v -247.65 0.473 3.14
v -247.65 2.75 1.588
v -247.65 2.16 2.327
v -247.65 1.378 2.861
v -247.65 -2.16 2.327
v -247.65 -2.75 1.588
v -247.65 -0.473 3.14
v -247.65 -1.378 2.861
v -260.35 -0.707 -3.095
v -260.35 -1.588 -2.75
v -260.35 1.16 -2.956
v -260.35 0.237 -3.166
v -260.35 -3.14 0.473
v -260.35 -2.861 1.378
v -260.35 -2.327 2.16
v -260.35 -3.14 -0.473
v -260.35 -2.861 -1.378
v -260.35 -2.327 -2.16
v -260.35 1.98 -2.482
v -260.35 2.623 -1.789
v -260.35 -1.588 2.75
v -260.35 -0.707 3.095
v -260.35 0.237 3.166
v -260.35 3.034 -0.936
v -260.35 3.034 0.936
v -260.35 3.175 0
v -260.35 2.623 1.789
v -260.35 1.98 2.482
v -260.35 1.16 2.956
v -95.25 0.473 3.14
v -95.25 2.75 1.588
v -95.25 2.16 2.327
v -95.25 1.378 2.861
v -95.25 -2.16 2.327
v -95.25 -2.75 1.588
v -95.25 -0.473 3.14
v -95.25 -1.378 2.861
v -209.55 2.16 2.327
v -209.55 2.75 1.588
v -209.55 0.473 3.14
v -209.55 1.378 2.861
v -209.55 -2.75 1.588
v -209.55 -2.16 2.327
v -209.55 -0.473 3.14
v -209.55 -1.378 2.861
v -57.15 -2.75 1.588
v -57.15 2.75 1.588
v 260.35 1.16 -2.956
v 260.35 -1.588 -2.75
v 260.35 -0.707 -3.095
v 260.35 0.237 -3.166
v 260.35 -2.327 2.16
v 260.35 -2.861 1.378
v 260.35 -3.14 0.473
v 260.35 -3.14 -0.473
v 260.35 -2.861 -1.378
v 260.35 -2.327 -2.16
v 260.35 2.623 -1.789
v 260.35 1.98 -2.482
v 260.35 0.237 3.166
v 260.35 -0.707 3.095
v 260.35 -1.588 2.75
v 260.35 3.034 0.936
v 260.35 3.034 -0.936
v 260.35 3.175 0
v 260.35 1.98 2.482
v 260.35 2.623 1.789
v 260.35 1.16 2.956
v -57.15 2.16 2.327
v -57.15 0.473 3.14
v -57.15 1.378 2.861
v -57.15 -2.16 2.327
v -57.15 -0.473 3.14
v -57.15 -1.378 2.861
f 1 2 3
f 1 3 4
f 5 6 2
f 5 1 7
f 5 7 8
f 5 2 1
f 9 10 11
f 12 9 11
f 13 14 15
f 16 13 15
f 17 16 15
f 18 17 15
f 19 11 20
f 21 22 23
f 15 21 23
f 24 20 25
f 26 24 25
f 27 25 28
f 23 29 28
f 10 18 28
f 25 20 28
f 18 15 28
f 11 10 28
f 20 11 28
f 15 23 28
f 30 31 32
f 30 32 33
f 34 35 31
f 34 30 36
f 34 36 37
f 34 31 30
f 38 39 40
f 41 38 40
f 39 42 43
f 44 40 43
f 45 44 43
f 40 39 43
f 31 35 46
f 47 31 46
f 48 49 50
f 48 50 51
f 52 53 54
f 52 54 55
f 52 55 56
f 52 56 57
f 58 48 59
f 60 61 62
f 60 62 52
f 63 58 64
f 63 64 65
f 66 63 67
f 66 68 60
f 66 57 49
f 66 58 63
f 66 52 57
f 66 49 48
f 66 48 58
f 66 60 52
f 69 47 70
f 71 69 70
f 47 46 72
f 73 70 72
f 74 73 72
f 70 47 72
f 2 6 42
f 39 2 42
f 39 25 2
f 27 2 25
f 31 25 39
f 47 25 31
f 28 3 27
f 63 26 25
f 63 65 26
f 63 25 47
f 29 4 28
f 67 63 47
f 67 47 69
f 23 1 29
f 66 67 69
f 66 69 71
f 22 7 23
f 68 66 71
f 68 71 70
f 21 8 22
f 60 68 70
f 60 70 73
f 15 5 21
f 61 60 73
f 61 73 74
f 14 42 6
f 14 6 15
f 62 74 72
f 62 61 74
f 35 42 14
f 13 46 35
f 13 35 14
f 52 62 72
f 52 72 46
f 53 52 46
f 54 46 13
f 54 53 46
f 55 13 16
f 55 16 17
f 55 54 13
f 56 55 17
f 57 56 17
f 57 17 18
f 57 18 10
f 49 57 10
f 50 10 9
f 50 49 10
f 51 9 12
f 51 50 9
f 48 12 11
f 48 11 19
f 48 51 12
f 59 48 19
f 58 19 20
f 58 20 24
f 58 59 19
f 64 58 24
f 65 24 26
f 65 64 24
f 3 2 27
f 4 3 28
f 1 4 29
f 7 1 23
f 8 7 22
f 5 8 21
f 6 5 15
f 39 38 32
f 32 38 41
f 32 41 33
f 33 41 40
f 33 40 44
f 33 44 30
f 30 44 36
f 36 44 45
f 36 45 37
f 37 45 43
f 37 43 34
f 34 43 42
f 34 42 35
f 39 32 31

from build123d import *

# Parameters (mm, degrees)
F0_R     = 3.175
F1_DEPTH = 260.35
F2_W     = 38.1
F2_H     = 5.08
F3_DEPTH = 12.7
F4_W     = 38.1
F4_H     = 5.08
F5_DEPTH = 12.7


with BuildPart() as f1:
    # F0 (on Right) → F1 (new body, symmetric)
    with BuildSketch(Plane.YZ):
        Circle(F0_R)
    extrude(amount=F1_DEPTH, both=True)

    # F2 (on Front) → F3 (cut, symmetric)
    with BuildSketch(Plane.XZ):
        with Locations((-228.6, 4.1275)):
            Rectangle(F2_W, F2_H)
    extrude(amount=F3_DEPTH, both=True, mode=Mode.SUBTRACT)

    # F4 (on Front) → F5 (cut, symmetric)
    with BuildSketch(Plane.XZ):
        with Locations((-76.2, 4.1275)):
            Rectangle(F4_W, F4_H)
    extrude(amount=F5_DEPTH, both=True, mode=Mode.SUBTRACT)


solid = f1.part
